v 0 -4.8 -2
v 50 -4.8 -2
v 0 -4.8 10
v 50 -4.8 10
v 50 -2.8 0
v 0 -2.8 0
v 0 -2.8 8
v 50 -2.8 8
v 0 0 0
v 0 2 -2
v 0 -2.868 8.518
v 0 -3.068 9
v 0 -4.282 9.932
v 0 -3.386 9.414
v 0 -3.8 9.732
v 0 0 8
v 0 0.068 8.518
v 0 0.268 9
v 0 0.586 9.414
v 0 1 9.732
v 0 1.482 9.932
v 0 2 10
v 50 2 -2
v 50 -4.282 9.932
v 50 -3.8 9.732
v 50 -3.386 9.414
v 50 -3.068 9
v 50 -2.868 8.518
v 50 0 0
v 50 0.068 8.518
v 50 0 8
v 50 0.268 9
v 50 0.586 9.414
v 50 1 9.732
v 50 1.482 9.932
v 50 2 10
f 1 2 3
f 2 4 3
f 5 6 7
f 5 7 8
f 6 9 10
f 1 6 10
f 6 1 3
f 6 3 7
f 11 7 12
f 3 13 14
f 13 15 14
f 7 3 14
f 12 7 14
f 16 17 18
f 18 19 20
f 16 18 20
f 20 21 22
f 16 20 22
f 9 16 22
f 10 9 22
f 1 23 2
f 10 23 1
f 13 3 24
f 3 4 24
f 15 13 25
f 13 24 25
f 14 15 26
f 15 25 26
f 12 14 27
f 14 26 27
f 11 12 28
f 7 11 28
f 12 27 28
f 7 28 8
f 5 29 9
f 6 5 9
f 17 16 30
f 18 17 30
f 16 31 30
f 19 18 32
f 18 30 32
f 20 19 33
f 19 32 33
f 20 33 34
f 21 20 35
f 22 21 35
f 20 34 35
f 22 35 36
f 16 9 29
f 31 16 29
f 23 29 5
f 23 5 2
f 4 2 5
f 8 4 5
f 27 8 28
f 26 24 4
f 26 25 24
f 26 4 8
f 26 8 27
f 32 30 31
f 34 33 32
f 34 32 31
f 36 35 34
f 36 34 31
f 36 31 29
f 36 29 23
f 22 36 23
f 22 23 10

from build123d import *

# Parameters (mm, degrees)
SKETCH_1_W        = 50
SKETCH_1_H        = 2
EXTRUDE_1_DEPTH   = 10
EXTRUDE_1_2_DEPTH = 10
SKETCH_2_W        = 50
SKETCH_2_H        = 6.8
EXTRUDE_2_DEPTH   = 2
FILLET_1_R        = 2


with BuildPart() as part:
    # 草图1 → 凸台-拉伸1 (new body)
    with BuildSketch(Plane.XY):
        with Locations((25, 1)):
            Rectangle(SKETCH_1_W, SKETCH_1_H)
    extrude(amount=EXTRUDE_1_DEPTH)



with BuildPart() as body_2:
    # 草图1 → Extrude 1 2 (new body)
    with BuildSketch(Plane.XY):
        with Locations((25, -3.8)):
            Rectangle(SKETCH_1_W, SKETCH_1_H)
    extrude(amount=EXTRUDE_1_2_DEPTH)


with BuildPart() as part_1:
    add(part.part)

    add(body_2.part)  # 凸台-拉伸2 merges body 2
    # 草图2 → 凸台-拉伸2 (add)
    with BuildSketch(Plane(origin=(0, 0, 0), x_dir=(-1, 0, 0), z_dir=(0, 0, -1))):
        with Locations((-25, -1.4)):
            Rectangle(SKETCH_2_W, SKETCH_2_H)
    extrude(amount=EXTRUDE_2_DEPTH)

    # 圆角1
    fillet_1_edges = [part_1.edges().sort_by_distance(p)[0] for p in [
        (25, -2.8, 10),
        (25, 0, 10),
    ]]
    fillet(fillet_1_edges, radius=FILLET_1_R - 0.0001)  # a hair under: the kernel refuses the full size


solid = part_1.part
